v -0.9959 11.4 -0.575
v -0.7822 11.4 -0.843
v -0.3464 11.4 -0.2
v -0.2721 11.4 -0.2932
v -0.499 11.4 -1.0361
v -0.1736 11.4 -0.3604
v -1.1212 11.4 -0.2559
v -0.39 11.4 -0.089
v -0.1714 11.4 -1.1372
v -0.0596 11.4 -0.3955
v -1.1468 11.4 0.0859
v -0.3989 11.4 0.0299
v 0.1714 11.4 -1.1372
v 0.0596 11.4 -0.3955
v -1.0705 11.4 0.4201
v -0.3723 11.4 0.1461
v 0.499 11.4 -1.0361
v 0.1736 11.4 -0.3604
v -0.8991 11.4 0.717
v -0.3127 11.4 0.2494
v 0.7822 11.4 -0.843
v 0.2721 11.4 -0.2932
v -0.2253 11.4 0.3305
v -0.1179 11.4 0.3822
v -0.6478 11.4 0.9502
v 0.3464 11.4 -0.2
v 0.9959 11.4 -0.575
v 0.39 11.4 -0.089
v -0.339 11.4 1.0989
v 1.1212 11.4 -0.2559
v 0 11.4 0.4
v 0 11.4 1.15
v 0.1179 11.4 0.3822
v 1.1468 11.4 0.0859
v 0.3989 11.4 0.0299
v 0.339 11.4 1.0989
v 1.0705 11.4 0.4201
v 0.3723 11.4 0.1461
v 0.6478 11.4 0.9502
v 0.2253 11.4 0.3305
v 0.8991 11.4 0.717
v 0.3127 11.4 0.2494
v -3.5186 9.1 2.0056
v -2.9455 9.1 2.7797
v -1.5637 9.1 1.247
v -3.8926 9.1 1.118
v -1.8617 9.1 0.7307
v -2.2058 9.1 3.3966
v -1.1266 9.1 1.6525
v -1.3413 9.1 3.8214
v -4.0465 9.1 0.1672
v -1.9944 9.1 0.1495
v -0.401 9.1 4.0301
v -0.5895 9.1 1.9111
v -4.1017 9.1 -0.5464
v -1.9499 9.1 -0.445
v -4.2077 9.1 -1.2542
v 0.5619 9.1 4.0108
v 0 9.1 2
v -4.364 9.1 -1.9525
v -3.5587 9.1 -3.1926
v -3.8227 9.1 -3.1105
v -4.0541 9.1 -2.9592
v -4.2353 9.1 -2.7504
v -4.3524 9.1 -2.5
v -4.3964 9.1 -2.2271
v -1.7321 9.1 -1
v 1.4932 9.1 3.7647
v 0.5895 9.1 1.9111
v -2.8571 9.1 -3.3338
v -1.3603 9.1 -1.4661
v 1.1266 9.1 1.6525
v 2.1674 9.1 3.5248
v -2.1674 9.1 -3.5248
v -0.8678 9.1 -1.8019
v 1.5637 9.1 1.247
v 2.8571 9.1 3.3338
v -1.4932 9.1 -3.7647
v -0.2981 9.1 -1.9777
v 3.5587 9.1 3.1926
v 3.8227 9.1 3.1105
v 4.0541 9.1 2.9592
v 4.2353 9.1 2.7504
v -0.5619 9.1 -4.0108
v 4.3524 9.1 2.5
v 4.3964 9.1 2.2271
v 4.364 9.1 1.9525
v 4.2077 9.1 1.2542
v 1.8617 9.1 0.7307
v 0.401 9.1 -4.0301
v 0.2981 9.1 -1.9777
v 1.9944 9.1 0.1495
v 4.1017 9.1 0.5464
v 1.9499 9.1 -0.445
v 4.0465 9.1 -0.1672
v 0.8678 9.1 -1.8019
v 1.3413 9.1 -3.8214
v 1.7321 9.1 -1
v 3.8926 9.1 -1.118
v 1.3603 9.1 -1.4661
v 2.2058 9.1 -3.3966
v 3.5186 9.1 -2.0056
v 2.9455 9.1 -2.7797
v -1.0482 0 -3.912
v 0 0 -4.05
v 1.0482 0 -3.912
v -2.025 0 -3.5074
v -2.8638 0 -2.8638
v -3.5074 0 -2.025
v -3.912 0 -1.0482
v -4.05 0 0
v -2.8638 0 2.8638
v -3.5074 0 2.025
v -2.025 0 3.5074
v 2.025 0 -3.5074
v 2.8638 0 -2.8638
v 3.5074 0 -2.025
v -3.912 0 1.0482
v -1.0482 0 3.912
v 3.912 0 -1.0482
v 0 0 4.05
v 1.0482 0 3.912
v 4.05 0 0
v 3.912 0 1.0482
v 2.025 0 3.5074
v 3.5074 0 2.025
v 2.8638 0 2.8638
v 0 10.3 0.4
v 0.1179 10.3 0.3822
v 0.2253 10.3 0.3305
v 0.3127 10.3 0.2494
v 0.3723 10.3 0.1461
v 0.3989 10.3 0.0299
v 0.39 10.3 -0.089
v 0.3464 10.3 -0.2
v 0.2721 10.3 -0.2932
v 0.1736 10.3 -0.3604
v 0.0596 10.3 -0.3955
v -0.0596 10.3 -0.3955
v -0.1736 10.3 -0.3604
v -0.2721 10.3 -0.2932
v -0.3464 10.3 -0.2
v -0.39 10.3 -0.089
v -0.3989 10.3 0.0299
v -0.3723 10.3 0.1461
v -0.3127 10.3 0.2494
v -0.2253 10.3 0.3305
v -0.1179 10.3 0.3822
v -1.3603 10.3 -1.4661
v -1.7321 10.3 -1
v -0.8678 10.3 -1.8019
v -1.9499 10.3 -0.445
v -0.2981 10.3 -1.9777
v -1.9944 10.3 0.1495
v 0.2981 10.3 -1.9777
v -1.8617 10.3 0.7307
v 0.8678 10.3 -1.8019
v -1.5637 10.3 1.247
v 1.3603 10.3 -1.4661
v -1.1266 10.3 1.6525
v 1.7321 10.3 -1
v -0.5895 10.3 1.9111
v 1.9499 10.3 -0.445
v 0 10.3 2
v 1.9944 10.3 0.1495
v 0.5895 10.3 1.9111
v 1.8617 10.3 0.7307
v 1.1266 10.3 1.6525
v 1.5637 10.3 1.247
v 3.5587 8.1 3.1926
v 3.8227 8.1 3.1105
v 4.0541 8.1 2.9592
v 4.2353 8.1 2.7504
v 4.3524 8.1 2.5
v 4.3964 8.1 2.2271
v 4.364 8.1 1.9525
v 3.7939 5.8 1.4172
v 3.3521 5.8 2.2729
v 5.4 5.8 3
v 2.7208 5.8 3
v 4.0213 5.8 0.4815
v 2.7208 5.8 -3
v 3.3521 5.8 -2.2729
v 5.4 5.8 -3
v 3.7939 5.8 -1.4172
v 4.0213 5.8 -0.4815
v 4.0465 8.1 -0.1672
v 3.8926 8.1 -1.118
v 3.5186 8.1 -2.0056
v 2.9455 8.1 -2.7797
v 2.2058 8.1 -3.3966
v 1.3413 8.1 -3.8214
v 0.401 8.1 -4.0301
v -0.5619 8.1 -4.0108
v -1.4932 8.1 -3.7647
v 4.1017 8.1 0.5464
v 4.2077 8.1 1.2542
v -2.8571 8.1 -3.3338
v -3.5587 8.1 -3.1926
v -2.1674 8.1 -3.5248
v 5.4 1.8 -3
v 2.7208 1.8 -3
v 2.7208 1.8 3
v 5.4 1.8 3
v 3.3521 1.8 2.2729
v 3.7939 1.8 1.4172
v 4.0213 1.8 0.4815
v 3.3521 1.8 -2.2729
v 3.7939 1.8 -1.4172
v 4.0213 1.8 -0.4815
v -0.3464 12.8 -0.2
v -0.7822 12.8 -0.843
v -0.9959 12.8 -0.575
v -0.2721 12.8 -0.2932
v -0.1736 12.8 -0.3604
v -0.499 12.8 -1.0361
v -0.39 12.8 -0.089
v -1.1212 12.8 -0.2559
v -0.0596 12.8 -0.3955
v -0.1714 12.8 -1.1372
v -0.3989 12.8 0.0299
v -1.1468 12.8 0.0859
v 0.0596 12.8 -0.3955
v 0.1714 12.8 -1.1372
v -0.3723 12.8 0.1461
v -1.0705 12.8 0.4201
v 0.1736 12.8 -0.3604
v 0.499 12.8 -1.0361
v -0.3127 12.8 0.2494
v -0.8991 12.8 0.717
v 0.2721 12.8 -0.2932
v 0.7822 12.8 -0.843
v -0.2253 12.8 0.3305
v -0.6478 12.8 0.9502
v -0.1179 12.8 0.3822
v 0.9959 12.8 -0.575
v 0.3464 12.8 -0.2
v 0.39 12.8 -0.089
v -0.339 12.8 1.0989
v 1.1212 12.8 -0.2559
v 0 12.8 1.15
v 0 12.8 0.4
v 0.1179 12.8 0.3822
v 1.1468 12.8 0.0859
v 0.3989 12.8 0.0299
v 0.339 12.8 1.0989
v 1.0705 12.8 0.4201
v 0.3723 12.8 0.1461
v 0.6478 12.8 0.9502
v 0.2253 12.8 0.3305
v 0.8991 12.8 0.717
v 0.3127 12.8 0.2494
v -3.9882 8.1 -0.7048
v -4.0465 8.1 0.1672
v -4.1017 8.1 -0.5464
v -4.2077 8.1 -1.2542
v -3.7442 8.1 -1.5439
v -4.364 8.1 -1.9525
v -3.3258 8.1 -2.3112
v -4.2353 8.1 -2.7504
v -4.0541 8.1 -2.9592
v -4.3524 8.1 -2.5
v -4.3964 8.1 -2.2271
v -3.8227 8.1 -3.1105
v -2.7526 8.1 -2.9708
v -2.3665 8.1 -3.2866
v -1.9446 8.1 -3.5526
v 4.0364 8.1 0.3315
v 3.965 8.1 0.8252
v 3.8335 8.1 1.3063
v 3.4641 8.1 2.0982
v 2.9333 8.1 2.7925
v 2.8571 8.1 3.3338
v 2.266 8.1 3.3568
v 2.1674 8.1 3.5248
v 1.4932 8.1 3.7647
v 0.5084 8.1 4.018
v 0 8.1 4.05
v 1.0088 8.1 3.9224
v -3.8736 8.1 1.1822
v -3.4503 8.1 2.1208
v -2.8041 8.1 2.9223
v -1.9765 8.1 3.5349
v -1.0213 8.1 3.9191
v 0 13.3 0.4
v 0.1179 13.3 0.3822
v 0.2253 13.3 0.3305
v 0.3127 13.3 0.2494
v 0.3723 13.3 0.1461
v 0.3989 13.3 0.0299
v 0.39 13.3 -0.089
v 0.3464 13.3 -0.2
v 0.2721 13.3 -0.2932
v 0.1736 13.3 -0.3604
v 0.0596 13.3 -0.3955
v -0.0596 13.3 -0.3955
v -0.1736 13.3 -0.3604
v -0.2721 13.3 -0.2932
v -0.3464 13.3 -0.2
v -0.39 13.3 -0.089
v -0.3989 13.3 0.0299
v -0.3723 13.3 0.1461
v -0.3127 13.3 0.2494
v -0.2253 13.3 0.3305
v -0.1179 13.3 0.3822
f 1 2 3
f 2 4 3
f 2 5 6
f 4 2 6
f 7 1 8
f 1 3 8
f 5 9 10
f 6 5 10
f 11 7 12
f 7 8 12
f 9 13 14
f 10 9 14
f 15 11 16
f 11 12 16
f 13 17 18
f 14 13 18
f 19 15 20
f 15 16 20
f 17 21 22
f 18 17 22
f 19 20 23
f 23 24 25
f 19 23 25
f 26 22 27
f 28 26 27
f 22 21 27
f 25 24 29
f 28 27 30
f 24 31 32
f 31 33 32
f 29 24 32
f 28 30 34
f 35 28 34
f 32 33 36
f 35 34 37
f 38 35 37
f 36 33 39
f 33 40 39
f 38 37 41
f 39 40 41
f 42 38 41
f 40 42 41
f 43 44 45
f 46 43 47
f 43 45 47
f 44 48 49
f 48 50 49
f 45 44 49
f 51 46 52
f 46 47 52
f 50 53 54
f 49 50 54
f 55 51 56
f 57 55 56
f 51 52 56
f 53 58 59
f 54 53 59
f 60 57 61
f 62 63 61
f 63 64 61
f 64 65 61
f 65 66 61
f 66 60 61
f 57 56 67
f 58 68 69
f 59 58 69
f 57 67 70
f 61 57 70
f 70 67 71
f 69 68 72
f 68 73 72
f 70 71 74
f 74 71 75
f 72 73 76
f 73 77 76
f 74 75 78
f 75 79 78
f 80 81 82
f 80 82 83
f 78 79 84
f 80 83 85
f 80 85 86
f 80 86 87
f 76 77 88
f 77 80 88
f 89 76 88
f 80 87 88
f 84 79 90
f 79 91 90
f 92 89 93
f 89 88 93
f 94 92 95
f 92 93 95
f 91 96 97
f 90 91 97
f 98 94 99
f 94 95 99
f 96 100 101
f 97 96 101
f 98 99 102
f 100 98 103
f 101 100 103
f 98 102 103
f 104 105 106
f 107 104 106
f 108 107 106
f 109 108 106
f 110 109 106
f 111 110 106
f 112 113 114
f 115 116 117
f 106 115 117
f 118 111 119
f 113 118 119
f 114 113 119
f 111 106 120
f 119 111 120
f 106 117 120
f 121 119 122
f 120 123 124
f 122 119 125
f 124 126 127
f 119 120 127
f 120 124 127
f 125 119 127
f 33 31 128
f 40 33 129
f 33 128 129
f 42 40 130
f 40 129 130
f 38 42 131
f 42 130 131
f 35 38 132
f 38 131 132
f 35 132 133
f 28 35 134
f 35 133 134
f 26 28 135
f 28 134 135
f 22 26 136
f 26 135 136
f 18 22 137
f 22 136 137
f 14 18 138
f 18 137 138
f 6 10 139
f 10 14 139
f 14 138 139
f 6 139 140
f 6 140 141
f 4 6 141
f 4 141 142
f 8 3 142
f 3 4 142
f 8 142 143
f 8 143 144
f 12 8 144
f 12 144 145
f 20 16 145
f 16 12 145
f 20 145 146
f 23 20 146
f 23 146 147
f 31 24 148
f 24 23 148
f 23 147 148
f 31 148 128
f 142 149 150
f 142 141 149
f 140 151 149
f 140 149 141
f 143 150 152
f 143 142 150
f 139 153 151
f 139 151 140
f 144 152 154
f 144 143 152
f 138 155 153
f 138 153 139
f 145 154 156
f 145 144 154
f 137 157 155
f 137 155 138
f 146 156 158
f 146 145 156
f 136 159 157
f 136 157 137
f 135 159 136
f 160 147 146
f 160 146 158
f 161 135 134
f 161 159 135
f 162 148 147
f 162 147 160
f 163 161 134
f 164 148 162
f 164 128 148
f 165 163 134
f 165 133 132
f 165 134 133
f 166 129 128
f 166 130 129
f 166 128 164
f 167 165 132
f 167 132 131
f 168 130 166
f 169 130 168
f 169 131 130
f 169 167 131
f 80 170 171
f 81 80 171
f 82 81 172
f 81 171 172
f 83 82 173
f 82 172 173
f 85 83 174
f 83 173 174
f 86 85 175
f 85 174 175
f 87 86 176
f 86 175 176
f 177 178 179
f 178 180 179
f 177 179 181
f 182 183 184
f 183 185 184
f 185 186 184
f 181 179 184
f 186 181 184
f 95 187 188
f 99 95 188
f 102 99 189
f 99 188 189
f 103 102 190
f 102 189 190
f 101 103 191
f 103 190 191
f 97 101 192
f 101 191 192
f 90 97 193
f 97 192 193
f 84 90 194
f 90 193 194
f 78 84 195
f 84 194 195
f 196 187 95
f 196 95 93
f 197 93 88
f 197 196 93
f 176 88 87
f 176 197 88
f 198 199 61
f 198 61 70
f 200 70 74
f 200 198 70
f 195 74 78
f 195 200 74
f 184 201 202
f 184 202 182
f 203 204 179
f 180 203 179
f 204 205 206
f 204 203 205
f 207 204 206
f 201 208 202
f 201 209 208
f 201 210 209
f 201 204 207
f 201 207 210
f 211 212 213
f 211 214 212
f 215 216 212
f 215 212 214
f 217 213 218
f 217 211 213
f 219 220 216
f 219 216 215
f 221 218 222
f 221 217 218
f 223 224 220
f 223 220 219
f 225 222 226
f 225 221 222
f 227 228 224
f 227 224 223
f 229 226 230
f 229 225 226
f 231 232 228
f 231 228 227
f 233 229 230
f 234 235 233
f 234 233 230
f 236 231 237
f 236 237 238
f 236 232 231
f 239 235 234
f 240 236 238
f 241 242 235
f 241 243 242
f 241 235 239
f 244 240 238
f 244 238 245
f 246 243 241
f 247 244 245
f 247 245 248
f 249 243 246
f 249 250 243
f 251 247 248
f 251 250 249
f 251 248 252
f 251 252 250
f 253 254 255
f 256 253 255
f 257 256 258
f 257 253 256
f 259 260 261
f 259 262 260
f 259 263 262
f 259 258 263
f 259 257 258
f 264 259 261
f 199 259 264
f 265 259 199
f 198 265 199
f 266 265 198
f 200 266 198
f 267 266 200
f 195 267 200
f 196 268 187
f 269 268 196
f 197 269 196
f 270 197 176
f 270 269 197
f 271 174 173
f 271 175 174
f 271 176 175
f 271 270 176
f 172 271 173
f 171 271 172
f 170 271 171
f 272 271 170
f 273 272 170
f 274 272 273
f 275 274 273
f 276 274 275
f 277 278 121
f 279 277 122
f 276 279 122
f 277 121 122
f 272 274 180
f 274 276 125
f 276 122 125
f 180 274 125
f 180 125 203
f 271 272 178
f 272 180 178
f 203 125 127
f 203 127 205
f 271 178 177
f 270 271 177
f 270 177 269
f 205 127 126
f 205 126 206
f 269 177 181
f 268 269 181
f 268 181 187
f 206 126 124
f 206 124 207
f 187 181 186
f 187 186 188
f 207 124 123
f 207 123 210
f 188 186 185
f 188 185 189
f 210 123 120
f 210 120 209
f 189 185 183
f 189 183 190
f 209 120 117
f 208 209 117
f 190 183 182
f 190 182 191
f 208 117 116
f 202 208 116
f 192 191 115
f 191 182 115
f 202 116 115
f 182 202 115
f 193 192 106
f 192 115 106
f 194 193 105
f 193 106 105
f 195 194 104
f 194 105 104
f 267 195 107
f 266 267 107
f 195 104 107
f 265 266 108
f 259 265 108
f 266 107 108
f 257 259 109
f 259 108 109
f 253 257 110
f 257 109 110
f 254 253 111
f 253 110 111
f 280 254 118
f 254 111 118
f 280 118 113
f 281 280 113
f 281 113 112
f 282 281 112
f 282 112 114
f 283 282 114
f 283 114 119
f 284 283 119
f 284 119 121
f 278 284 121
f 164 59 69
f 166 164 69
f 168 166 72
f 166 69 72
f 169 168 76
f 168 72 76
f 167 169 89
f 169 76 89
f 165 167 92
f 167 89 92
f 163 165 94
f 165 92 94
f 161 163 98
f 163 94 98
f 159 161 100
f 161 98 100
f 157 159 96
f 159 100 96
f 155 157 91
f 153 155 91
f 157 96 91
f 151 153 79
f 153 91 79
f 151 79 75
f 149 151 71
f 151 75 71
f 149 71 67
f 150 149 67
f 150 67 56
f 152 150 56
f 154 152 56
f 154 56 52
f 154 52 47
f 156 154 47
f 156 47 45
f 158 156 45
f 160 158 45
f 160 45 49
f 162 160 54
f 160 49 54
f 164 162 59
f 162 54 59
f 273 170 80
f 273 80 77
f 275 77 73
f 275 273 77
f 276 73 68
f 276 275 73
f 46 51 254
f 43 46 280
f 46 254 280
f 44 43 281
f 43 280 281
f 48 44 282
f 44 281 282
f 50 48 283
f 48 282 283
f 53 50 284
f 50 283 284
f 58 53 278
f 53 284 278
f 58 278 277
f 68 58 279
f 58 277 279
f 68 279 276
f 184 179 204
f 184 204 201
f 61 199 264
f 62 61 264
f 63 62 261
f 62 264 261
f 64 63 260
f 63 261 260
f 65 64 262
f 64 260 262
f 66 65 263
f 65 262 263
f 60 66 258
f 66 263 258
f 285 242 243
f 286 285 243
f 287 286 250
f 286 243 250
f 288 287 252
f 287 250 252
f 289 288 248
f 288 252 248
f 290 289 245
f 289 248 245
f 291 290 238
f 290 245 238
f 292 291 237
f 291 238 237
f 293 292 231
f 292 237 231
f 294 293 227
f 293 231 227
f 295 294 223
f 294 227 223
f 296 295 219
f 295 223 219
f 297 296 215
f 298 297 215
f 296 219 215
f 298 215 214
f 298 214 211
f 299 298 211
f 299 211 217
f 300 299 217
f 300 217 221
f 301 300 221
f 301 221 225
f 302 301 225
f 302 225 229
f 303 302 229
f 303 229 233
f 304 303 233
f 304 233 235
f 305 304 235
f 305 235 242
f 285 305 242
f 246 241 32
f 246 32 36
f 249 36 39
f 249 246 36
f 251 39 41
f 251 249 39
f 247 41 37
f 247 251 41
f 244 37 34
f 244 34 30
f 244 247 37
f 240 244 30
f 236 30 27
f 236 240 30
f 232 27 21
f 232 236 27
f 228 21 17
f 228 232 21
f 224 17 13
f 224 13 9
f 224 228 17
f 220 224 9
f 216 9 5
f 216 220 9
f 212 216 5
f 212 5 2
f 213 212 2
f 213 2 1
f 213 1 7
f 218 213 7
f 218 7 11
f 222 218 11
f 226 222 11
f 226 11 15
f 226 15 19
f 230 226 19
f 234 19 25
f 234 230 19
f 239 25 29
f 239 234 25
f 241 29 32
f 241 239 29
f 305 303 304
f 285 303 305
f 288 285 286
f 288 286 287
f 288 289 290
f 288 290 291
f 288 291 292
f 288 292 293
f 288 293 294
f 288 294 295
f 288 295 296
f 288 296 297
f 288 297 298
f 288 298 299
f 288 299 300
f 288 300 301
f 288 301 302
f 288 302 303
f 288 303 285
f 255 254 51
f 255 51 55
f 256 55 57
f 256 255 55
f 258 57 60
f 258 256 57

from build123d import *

# Parameters (mm, degrees)
SKETCH1_R                = 4.05
BOSS_EXTRUDE1_DEPTH      = 8.1
BOSS_EXTRUDE2_DEPTH      = 1
FILLET1_R                = 10
SKETCH3_R                = 2
BOSS_EXTRUDE3_DEPTH      = 1.2
SKETCH4_R                = 0.4
BOSS_EXTRUDE4_DEPTH      = 3
BOSS_EXTRUDE5_START      = -0.5
SKETCH5_R                = 1.15
BOSS_EXTRUDE5_DEPTH      = 1.4
BOSS_EXTRUDE6_REACH      = 19.008
BOSS_EXTRUDE6_END_RADIUS = 4.05
SKETCH6_W                = 6
SKETCH6_H                = 4


with BuildPart() as part:
    # Sketch1 → Boss-Extrude1 (new body)
    with BuildSketch(Plane(origin=(0, 0, 0), x_dir=(1, 0, 0), z_dir=(0, 1, 0))):
        with Locations(Location((0, 0, 0), (0, 0, 270))):
            Circle(SKETCH1_R)
    extrude(amount=BOSS_EXTRUDE1_DEPTH)

    # Sketch2 → Boss-Extrude2 (add)
    with BuildSketch(Plane(origin=(0, 8.1, 0), x_dir=(1, 0, 0), z_dir=(0, 1, 0))):
        with BuildLine():
            ThreePointArc((-3.833548742, 1.30629401), (-2.205788092, -3.3966158), (2.752603705, -2.9708034))
            ThreePointArc((2.752603705, -2.9708034), (4.235286368, -2.750427127), (3.833548742, -1.30629401))
            ThreePointArc((3.833548742, -1.30629401), (2.205788092, 3.3966158), (-2.752603705, 2.9708034))
            ThreePointArc((-2.752603705, 2.9708034), (-4.235286368, 2.750427127), (-3.833548742, 1.30629401))
        make_face()
    extrude(amount=BOSS_EXTRUDE2_DEPTH)

    # Fillet1
    # the kernel refuses this fillet: 10 mm, written as the material it adds along each edge
    with BuildSketch(Plane(origin=(-2.752603705, 8.1, -2.9708034), x_dir=(0.8459561601363162, 0, -0.5332524497153475), z_dir=(0, 1, 0)), Plane(origin=(2.752603705, 8.1, 2.9708034), x_dir=(-0.8459561601363164, 0, 0.5332524497153472), z_dir=(0, 1, 0))) as fillet1_piece_1:
        with BuildLine():
            CenterArc((3.326797297, 9.829634829), FILLET1_R, 247.104601823, 12.304164649)
            ThreePointArc((-0.563702324, 0.617468271), (-0.214223286, 0.370473326), (0, 0))
            ThreePointArc((0, 0), (0.74439387, 0.068997894), (1.488787741, 0))
        make_face()
    extrude(amount=1)
    with BuildSketch(Plane(origin=(-3.833548742, 8.1, -1.30629401), x_dir=(-0.14306898445110627, 0, 0.9897127187664757), z_dir=(0, 1, 0)), Plane(origin=(3.833548742, 8.1, 1.30629401), x_dir=(0.14306898445110644, 0, -0.9897127187664757), z_dir=(0, 1, 0))) as fillet1_piece_2:
        with BuildLine():
            CenterArc((3.326797297, -9.829634829), FILLET1_R, 100.591233529, 12.304164649)
            ThreePointArc((-0.563702324, -0.617468271), (-0.214223286, -0.370473326), (0, 0))
            ThreePointArc((0, 0), (0.74439387, -0.068997894), (1.488787741, 0))
        make_face()
    extrude(amount=1)

    # Sketch3 → Boss-Extrude3 (add)
    with BuildSketch(Plane(origin=(0, 9.1, 0), x_dir=(1, 0, 0), z_dir=(0, 1, 0))):
        with Locations(Location((0, 0, 0), (0, 0, 270))):
            Circle(SKETCH3_R)
    extrude(amount=BOSS_EXTRUDE3_DEPTH)

    # Sketch4 → Boss-Extrude4 (add)
    with BuildSketch(Plane(origin=(0, 10.3, 0), x_dir=(1, 0, 0), z_dir=(0, 1, 0))):
        with Locations(Location((0, 0, 0), (0, 0, 270))):
            Circle(SKETCH4_R)
    extrude(amount=BOSS_EXTRUDE4_DEPTH)

    # Sketch5 → Boss-Extrude5 (add)
    with BuildSketch(Plane(origin=(0, 13.3, 0), x_dir=(1, 0, 0), z_dir=(0, 1, 0)).offset(BOSS_EXTRUDE5_START)):
        with Locations(Location((0, 0, 0), (0, 0, 270))):
            Circle(SKETCH5_R)
    extrude(amount=-BOSS_EXTRUDE5_DEPTH)

    # Boss-Extrude6: up to this cylinder (the profile starts outside it)
    boss_extrude6_end = Plane(origin=(0, 3.8, 0), z_dir=(0, -1, 0)) * Cylinder(BOSS_EXTRUDE6_END_RADIUS, 47.116, mode=Mode.PRIVATE)
    # Sketch6 → Boss-Extrude6 (add, up to the surface)
    with BuildSketch(Plane(origin=(5.4, 0, 0), x_dir=(0, 0, -1), z_dir=(1, 0, 0)), mode=Mode.PRIVATE) as boss_extrude6_sk1:
        with Locations((0, 3.8)):
            Rectangle(SKETCH6_W, SKETCH6_H)
    boss_extrude6_tool1 = extrude(boss_extrude6_sk1.sketch, amount=-BOSS_EXTRUDE6_REACH, mode=Mode.PRIVATE) - boss_extrude6_end
    add(boss_extrude6_tool1.solids().sort_by_distance((5.4, 3.8, 0))[0])


solid = part.part
